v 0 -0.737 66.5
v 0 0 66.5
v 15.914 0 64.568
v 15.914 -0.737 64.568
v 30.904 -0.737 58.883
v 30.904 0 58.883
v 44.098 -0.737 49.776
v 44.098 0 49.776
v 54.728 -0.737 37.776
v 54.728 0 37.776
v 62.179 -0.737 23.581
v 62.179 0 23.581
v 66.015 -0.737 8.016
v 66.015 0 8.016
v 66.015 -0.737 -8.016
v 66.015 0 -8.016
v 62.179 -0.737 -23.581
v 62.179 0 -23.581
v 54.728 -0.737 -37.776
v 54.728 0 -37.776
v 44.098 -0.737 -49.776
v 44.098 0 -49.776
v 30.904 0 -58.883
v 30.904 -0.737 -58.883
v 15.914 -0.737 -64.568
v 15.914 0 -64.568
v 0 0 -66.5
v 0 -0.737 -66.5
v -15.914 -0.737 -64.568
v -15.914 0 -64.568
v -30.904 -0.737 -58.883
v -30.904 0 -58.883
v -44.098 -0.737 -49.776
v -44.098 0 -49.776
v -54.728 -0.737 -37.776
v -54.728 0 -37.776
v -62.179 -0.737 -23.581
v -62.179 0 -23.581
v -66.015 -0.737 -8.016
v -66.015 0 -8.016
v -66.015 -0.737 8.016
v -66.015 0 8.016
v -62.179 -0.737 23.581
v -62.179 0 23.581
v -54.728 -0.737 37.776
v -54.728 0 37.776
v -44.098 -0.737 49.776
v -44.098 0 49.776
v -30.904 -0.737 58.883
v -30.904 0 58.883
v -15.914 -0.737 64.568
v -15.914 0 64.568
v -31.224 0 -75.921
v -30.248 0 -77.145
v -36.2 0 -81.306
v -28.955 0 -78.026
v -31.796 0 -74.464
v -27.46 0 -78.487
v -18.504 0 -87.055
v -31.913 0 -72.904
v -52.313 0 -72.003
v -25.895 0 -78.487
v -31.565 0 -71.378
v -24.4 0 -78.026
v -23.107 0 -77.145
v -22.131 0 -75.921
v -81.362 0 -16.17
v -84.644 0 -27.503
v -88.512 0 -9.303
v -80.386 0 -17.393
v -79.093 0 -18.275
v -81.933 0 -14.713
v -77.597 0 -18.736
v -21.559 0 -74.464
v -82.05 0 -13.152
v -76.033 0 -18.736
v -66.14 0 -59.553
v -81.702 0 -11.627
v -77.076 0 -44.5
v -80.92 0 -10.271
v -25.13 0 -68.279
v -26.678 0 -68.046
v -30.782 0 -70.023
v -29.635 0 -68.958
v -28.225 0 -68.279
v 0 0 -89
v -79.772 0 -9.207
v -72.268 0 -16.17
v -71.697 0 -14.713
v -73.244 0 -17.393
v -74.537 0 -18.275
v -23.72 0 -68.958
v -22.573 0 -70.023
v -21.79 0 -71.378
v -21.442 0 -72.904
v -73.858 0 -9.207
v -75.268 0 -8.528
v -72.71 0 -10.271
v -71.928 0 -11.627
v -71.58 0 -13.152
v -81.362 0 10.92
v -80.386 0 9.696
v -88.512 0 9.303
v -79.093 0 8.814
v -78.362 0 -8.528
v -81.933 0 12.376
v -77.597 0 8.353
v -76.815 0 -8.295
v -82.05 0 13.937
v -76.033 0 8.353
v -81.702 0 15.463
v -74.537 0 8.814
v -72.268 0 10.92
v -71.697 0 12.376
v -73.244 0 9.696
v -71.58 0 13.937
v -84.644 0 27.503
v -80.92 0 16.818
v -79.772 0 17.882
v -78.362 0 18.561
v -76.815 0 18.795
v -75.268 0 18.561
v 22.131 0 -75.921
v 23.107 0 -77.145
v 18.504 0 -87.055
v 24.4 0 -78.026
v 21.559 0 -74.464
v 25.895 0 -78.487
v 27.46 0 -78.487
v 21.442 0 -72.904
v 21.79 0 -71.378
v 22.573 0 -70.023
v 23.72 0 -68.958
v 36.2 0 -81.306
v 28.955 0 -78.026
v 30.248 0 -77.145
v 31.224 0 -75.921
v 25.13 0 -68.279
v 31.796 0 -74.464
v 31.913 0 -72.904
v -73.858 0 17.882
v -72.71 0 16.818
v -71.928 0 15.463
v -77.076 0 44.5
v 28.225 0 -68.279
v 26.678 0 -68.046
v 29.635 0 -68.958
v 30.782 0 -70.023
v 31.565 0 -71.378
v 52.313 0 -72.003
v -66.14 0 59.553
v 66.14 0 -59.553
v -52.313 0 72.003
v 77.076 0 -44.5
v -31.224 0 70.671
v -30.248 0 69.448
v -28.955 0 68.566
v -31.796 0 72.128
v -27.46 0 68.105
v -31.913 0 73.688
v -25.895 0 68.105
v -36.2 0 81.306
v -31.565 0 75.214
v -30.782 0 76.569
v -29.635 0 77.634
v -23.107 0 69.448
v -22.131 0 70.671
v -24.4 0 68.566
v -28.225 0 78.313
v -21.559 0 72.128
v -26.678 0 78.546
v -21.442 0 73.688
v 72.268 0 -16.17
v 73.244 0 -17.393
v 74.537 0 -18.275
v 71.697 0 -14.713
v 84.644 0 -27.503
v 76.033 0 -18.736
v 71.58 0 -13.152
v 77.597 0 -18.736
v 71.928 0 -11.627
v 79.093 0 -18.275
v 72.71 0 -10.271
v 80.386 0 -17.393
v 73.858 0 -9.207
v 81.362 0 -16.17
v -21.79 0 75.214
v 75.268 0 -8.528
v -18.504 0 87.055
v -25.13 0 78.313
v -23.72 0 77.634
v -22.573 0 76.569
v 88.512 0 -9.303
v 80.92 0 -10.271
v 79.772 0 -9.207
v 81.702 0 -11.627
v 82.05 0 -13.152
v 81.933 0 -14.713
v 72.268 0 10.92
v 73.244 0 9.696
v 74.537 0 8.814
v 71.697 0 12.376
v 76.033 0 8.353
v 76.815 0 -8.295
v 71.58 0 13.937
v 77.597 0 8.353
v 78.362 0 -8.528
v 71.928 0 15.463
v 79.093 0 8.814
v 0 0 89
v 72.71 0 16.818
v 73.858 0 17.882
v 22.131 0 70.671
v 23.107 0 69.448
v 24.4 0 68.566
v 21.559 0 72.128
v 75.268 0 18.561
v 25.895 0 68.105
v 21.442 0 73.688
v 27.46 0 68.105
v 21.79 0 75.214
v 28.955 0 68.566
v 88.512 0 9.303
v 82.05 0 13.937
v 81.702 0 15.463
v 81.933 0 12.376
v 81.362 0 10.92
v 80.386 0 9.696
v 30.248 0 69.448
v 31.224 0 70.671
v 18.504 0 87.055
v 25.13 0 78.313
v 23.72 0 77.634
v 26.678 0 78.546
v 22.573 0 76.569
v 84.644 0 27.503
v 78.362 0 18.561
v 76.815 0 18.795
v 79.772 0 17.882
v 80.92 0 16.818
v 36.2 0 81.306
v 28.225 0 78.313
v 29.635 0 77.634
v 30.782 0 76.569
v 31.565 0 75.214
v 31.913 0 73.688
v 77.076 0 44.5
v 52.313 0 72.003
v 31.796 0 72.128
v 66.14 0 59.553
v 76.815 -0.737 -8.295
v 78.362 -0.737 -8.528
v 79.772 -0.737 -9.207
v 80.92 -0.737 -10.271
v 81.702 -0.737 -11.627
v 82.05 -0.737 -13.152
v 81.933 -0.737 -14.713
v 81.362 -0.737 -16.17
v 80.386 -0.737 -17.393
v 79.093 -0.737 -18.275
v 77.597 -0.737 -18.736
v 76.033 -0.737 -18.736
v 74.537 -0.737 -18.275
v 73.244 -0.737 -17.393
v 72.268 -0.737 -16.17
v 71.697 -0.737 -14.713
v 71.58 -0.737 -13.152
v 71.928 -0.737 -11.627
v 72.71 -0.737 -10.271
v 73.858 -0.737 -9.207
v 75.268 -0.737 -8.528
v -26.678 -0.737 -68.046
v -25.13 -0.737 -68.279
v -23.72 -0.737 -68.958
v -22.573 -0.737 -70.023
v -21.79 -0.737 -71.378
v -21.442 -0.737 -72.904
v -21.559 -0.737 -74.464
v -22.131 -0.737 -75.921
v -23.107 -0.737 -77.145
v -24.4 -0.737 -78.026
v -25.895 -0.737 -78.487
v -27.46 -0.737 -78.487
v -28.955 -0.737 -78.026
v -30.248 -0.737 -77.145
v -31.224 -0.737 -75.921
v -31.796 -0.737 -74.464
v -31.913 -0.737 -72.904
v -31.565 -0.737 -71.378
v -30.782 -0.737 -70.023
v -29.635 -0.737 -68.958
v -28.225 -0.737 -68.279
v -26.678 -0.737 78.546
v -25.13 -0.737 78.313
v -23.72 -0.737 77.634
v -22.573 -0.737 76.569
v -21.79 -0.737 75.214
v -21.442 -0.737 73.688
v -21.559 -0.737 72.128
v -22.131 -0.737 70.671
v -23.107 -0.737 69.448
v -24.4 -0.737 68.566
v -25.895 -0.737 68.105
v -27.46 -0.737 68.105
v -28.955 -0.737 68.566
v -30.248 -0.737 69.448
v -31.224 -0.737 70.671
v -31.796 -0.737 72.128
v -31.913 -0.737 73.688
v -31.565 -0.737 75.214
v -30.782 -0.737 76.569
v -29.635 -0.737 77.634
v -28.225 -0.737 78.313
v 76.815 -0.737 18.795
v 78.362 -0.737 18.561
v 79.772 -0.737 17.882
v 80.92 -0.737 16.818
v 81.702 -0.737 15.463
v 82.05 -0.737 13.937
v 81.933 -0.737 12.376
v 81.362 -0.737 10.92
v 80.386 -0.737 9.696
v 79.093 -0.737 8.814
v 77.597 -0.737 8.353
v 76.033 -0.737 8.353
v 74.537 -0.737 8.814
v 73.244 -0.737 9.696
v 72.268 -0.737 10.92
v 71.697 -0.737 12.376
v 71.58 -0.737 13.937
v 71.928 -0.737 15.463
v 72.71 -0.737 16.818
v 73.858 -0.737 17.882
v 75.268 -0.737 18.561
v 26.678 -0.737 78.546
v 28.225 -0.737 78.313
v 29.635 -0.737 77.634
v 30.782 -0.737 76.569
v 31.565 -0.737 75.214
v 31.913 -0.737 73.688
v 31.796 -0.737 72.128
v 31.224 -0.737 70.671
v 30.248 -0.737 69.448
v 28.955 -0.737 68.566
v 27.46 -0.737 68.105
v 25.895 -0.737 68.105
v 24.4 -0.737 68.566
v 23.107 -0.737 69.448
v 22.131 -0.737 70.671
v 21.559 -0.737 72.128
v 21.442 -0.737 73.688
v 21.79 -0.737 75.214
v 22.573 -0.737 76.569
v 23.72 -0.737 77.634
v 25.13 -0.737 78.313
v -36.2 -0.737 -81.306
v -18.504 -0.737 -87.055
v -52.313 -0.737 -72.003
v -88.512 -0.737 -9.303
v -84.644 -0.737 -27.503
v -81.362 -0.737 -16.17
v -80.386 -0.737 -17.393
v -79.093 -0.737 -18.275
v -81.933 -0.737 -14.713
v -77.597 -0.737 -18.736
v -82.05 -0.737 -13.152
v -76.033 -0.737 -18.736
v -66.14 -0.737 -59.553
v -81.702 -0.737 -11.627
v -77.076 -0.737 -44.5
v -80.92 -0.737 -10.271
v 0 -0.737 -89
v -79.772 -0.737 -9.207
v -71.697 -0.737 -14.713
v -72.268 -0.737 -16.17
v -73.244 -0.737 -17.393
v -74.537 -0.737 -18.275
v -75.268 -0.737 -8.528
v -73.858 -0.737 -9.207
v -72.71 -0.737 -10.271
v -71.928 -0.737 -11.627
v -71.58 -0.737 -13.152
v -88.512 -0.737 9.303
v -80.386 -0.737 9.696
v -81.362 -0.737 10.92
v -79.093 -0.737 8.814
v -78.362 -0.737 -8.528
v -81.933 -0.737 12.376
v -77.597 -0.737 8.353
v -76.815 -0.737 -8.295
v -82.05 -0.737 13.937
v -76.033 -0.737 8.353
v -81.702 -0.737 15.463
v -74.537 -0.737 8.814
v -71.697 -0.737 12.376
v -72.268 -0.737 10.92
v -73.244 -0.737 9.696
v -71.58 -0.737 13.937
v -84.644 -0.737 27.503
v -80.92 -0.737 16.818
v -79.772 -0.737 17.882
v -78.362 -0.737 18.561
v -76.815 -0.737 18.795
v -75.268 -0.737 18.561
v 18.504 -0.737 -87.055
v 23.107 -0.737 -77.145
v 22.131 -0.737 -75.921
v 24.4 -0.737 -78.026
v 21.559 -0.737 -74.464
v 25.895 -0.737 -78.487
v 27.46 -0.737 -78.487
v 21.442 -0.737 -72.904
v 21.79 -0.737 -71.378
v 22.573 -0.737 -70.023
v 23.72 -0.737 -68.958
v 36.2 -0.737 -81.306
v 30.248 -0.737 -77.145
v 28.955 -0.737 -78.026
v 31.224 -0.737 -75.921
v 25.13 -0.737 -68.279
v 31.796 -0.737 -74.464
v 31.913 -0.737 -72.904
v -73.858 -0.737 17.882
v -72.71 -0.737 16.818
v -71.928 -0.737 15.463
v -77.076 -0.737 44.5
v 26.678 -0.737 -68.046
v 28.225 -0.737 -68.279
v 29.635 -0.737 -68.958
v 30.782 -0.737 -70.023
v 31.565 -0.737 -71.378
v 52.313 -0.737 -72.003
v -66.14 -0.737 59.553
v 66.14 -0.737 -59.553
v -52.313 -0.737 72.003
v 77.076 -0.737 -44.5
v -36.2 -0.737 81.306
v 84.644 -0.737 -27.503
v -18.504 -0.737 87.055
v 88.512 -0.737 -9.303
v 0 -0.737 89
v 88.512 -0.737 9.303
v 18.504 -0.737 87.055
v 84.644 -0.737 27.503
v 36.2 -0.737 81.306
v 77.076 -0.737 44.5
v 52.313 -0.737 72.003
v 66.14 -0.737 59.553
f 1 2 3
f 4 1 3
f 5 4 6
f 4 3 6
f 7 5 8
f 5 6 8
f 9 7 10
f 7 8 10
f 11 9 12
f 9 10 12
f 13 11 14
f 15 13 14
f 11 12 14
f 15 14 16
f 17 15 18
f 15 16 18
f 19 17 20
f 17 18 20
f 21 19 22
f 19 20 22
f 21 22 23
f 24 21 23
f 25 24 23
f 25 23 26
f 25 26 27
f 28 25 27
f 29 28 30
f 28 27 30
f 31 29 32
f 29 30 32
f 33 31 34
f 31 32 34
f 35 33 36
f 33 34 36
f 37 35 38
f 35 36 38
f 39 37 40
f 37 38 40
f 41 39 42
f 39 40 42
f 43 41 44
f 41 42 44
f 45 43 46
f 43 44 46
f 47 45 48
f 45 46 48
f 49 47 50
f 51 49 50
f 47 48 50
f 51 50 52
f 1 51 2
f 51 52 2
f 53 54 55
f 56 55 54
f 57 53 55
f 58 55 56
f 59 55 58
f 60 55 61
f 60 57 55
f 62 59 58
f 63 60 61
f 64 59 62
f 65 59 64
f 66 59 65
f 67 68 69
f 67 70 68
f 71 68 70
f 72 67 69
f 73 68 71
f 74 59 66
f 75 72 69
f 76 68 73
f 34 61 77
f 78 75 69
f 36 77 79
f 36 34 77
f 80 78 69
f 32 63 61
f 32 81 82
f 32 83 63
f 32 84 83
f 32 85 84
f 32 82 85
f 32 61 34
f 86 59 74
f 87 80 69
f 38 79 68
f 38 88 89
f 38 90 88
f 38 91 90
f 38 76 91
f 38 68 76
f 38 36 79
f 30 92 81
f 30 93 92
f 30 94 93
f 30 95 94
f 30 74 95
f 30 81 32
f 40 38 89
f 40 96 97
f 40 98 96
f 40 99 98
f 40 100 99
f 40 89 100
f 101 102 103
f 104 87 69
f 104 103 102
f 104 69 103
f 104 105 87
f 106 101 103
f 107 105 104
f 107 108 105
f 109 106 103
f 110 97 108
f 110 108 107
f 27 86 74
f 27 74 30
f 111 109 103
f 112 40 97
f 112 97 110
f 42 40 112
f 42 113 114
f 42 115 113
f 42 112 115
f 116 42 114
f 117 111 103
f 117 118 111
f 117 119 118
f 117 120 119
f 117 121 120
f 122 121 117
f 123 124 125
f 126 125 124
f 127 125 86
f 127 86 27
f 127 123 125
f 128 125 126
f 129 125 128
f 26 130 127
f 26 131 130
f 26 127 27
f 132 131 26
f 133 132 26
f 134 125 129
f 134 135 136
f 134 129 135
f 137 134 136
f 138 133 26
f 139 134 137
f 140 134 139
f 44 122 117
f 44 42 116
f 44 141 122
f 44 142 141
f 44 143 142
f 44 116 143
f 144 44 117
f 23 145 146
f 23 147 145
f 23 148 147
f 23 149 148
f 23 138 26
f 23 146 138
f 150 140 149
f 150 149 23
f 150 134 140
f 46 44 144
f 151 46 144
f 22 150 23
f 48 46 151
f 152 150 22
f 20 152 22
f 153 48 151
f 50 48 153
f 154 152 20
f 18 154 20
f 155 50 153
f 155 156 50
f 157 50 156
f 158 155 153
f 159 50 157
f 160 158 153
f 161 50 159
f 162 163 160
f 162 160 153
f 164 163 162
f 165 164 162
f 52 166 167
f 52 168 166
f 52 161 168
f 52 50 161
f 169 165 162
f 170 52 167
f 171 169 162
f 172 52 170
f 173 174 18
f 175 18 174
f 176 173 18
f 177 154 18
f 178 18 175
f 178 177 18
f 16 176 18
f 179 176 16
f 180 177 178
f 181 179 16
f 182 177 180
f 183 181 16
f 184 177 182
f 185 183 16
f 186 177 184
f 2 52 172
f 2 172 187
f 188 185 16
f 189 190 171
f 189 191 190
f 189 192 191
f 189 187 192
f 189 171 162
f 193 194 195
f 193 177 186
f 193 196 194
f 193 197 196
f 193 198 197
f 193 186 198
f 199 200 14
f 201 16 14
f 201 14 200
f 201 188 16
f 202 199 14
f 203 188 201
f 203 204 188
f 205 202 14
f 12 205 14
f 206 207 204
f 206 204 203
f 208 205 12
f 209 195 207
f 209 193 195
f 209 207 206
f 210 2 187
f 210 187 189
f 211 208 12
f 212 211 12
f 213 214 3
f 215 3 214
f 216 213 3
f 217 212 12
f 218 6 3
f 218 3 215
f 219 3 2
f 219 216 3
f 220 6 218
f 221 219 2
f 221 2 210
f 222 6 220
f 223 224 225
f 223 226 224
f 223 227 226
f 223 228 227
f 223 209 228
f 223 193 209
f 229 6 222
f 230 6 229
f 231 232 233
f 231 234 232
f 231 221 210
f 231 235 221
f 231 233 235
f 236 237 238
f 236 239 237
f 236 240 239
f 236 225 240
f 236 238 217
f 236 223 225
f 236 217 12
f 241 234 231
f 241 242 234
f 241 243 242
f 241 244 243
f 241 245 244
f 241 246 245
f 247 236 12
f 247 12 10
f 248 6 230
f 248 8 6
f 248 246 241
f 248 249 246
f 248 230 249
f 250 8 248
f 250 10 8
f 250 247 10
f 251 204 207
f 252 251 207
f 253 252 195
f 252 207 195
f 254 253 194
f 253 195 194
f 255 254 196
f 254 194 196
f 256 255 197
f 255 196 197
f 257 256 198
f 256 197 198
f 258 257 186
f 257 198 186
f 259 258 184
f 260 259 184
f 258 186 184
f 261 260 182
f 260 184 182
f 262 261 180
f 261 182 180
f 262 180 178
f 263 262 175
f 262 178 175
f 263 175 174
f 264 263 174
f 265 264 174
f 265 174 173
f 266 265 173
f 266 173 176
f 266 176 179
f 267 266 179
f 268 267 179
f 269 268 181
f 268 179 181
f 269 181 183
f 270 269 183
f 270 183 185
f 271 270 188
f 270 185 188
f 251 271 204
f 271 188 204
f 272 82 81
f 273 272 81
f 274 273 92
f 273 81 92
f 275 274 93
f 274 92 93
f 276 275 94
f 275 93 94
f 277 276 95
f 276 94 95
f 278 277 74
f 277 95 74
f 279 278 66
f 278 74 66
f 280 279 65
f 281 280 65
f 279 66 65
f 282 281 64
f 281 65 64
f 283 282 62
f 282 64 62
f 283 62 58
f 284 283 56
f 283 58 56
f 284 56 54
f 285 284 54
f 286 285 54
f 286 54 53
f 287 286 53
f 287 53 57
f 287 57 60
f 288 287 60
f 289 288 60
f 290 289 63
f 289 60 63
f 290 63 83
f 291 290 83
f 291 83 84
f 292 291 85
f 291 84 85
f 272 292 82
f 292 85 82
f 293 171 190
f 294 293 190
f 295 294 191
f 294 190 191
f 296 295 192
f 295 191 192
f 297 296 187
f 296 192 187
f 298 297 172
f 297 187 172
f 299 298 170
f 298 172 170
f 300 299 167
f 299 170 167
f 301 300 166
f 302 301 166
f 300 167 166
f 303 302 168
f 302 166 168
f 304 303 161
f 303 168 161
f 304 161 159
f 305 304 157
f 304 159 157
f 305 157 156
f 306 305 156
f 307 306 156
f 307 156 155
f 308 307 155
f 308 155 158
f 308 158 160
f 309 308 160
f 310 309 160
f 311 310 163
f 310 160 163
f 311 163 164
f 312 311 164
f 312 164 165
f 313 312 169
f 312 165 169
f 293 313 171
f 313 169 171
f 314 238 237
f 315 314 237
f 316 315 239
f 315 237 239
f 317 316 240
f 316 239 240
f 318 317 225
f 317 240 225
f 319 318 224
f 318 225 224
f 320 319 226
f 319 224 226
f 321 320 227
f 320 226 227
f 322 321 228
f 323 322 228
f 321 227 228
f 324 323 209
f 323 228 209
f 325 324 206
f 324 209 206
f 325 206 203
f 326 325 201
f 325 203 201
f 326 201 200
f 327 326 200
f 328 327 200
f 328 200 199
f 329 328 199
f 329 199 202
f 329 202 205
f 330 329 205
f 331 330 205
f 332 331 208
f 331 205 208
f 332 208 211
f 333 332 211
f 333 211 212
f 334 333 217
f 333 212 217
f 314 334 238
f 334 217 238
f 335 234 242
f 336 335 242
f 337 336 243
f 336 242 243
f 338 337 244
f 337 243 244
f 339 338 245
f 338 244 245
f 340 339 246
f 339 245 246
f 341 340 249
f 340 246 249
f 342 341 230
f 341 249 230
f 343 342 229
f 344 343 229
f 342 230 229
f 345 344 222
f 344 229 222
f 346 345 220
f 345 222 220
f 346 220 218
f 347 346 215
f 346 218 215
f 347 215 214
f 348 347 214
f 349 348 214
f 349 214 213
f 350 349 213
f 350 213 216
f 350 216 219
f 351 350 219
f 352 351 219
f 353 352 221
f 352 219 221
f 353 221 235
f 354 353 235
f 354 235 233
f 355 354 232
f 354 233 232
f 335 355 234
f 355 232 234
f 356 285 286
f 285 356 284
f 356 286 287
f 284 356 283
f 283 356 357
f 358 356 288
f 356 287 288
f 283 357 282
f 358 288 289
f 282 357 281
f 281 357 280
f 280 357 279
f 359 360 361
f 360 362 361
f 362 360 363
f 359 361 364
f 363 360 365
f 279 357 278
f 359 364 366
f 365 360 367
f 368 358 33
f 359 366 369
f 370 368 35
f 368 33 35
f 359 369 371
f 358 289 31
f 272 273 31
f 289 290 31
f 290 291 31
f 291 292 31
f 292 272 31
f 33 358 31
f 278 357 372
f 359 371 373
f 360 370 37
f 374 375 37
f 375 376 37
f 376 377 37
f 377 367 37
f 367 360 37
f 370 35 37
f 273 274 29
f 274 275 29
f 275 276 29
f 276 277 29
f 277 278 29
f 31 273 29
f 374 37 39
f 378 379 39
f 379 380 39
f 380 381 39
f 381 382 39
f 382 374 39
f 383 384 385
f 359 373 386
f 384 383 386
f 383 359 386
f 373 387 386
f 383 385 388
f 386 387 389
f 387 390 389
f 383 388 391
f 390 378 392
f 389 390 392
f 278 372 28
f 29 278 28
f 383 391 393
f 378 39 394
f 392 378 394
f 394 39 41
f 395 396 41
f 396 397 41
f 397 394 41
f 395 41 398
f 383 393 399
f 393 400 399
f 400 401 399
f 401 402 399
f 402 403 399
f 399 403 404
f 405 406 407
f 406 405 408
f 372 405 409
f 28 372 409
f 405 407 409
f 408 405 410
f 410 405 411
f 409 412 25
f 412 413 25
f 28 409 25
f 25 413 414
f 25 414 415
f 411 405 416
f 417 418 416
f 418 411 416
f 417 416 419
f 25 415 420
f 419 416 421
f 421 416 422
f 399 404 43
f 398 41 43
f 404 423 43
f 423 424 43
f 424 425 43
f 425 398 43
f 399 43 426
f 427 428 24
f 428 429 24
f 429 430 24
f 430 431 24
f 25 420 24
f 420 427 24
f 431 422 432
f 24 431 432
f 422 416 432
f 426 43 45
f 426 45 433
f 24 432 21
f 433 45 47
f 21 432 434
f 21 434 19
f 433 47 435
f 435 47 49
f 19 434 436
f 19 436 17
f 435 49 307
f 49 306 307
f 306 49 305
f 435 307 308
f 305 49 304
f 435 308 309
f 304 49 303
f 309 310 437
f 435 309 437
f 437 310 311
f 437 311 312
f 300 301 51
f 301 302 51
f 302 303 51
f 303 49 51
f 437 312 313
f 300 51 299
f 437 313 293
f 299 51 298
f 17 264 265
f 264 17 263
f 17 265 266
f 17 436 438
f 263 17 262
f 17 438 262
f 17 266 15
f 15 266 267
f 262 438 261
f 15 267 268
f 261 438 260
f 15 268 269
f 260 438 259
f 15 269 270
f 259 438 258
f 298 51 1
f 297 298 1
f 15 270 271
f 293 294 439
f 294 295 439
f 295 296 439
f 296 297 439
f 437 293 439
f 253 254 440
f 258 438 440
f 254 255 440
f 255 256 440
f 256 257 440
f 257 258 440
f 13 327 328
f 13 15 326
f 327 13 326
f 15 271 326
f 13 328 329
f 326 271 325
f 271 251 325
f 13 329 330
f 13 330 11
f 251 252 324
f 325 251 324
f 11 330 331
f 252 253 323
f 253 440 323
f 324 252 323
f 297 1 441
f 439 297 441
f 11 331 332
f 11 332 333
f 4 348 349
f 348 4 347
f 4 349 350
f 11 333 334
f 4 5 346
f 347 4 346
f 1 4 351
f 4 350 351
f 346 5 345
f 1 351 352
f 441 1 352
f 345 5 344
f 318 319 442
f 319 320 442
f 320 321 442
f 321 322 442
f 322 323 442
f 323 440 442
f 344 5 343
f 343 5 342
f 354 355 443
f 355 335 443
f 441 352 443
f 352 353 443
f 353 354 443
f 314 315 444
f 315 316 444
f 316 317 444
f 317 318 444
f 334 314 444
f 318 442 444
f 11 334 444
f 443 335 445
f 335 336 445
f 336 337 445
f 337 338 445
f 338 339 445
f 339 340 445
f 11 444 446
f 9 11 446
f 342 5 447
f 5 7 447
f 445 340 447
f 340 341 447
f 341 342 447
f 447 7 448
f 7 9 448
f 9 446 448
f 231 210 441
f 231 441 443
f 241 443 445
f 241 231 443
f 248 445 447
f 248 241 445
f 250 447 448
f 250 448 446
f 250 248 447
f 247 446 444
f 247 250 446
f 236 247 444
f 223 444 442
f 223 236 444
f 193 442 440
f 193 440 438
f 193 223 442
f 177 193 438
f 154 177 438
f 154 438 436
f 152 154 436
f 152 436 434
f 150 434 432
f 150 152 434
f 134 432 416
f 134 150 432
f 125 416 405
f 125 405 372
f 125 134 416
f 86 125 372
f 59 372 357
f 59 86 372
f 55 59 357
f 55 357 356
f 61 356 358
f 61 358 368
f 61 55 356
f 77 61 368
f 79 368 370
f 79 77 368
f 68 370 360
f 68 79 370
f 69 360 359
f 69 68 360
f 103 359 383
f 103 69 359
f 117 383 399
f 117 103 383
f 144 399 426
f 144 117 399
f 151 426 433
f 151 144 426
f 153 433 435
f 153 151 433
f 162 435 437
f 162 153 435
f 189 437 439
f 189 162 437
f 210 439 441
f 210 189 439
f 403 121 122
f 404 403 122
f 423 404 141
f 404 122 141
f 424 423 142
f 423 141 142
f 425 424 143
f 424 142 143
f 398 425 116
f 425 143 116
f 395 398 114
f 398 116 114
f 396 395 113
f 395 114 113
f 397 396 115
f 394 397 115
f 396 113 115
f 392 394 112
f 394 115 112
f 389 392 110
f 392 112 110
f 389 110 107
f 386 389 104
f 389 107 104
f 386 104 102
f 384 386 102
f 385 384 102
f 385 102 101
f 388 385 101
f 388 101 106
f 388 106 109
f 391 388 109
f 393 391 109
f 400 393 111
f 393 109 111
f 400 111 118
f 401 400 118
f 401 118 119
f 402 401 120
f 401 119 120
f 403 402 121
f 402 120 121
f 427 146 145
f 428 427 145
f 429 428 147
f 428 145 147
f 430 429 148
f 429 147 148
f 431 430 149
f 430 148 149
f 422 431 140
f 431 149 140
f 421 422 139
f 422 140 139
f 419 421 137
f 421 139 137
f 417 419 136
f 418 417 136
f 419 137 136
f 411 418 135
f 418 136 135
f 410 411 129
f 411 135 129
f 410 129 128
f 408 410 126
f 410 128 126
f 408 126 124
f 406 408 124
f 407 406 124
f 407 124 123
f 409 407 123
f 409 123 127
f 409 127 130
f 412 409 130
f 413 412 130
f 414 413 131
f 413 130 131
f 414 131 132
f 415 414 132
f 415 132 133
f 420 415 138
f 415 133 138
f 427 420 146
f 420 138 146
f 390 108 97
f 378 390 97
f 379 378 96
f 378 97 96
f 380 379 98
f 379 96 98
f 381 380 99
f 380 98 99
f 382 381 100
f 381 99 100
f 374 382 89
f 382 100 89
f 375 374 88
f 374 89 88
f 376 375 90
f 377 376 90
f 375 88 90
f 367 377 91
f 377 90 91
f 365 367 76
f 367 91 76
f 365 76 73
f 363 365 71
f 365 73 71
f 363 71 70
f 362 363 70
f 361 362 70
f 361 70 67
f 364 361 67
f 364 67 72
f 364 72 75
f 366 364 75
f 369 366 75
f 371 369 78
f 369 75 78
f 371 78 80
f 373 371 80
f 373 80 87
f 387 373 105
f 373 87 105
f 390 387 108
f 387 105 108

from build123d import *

# Parameters (mm, degrees)
SKETCH1_R          = 89
SKETCH1_R_2        = 66.5
SKETCH1_R_3        = 5.25
BASE_FLANGE1_DEPTH = 0.7366


# Sheet-metal steps are written as plain solids
with BuildPart() as part:
    # Sketch1 → Base-Flange1 (new body)
    with BuildSketch(Plane(origin=(0, 0, 0), x_dir=(1, 0, 0), z_dir=(0, 1, 0))):
        with Locations(Location((0, 0, 0), (0, 0, 270))):
            Circle(SKETCH1_R)
        with Locations(Location((0, 0, 0), (0, 0, 270))):
            Circle(SKETCH1_R_2, mode=Mode.SUBTRACT)
        with Locations(Location((26.677571179, 73.296024421, 0), (0, 0, 270))):
            Circle(SKETCH1_R_3, mode=Mode.SUBTRACT)
        with Locations(Location((-26.677571179, 73.296024421, 0), (0, 0, 270))):
            Circle(SKETCH1_R_3, mode=Mode.SUBTRACT)
        with Locations(Location((-76.815004735, 13.544557858, 0), (0, 0, 270))):
            Circle(SKETCH1_R_3, mode=Mode.SUBTRACT)
        with Locations(Location((-76.815004735, -13.544557858, 0), (0, 0, 270))):
            Circle(SKETCH1_R_3, mode=Mode.SUBTRACT)
        with Locations(Location((-26.677571179, -73.296024421, 0), (0, 0, 270))):
            Circle(SKETCH1_R_3, mode=Mode.SUBTRACT)
        with Locations(Location((26.677571179, -73.296024421, 0), (0, 0, 270))):
            Circle(SKETCH1_R_3, mode=Mode.SUBTRACT)
        with Locations(Location((76.815004735, 13.544557858, 0), (0, 0, 270))):
            Circle(SKETCH1_R_3, mode=Mode.SUBTRACT)
        with Locations(Location((76.815004735, -13.544557858, 0), (0, 0, 270))):
            Circle(SKETCH1_R_3, mode=Mode.SUBTRACT)
    extrude(amount=-BASE_FLANGE1_DEPTH)


solid = part.part
